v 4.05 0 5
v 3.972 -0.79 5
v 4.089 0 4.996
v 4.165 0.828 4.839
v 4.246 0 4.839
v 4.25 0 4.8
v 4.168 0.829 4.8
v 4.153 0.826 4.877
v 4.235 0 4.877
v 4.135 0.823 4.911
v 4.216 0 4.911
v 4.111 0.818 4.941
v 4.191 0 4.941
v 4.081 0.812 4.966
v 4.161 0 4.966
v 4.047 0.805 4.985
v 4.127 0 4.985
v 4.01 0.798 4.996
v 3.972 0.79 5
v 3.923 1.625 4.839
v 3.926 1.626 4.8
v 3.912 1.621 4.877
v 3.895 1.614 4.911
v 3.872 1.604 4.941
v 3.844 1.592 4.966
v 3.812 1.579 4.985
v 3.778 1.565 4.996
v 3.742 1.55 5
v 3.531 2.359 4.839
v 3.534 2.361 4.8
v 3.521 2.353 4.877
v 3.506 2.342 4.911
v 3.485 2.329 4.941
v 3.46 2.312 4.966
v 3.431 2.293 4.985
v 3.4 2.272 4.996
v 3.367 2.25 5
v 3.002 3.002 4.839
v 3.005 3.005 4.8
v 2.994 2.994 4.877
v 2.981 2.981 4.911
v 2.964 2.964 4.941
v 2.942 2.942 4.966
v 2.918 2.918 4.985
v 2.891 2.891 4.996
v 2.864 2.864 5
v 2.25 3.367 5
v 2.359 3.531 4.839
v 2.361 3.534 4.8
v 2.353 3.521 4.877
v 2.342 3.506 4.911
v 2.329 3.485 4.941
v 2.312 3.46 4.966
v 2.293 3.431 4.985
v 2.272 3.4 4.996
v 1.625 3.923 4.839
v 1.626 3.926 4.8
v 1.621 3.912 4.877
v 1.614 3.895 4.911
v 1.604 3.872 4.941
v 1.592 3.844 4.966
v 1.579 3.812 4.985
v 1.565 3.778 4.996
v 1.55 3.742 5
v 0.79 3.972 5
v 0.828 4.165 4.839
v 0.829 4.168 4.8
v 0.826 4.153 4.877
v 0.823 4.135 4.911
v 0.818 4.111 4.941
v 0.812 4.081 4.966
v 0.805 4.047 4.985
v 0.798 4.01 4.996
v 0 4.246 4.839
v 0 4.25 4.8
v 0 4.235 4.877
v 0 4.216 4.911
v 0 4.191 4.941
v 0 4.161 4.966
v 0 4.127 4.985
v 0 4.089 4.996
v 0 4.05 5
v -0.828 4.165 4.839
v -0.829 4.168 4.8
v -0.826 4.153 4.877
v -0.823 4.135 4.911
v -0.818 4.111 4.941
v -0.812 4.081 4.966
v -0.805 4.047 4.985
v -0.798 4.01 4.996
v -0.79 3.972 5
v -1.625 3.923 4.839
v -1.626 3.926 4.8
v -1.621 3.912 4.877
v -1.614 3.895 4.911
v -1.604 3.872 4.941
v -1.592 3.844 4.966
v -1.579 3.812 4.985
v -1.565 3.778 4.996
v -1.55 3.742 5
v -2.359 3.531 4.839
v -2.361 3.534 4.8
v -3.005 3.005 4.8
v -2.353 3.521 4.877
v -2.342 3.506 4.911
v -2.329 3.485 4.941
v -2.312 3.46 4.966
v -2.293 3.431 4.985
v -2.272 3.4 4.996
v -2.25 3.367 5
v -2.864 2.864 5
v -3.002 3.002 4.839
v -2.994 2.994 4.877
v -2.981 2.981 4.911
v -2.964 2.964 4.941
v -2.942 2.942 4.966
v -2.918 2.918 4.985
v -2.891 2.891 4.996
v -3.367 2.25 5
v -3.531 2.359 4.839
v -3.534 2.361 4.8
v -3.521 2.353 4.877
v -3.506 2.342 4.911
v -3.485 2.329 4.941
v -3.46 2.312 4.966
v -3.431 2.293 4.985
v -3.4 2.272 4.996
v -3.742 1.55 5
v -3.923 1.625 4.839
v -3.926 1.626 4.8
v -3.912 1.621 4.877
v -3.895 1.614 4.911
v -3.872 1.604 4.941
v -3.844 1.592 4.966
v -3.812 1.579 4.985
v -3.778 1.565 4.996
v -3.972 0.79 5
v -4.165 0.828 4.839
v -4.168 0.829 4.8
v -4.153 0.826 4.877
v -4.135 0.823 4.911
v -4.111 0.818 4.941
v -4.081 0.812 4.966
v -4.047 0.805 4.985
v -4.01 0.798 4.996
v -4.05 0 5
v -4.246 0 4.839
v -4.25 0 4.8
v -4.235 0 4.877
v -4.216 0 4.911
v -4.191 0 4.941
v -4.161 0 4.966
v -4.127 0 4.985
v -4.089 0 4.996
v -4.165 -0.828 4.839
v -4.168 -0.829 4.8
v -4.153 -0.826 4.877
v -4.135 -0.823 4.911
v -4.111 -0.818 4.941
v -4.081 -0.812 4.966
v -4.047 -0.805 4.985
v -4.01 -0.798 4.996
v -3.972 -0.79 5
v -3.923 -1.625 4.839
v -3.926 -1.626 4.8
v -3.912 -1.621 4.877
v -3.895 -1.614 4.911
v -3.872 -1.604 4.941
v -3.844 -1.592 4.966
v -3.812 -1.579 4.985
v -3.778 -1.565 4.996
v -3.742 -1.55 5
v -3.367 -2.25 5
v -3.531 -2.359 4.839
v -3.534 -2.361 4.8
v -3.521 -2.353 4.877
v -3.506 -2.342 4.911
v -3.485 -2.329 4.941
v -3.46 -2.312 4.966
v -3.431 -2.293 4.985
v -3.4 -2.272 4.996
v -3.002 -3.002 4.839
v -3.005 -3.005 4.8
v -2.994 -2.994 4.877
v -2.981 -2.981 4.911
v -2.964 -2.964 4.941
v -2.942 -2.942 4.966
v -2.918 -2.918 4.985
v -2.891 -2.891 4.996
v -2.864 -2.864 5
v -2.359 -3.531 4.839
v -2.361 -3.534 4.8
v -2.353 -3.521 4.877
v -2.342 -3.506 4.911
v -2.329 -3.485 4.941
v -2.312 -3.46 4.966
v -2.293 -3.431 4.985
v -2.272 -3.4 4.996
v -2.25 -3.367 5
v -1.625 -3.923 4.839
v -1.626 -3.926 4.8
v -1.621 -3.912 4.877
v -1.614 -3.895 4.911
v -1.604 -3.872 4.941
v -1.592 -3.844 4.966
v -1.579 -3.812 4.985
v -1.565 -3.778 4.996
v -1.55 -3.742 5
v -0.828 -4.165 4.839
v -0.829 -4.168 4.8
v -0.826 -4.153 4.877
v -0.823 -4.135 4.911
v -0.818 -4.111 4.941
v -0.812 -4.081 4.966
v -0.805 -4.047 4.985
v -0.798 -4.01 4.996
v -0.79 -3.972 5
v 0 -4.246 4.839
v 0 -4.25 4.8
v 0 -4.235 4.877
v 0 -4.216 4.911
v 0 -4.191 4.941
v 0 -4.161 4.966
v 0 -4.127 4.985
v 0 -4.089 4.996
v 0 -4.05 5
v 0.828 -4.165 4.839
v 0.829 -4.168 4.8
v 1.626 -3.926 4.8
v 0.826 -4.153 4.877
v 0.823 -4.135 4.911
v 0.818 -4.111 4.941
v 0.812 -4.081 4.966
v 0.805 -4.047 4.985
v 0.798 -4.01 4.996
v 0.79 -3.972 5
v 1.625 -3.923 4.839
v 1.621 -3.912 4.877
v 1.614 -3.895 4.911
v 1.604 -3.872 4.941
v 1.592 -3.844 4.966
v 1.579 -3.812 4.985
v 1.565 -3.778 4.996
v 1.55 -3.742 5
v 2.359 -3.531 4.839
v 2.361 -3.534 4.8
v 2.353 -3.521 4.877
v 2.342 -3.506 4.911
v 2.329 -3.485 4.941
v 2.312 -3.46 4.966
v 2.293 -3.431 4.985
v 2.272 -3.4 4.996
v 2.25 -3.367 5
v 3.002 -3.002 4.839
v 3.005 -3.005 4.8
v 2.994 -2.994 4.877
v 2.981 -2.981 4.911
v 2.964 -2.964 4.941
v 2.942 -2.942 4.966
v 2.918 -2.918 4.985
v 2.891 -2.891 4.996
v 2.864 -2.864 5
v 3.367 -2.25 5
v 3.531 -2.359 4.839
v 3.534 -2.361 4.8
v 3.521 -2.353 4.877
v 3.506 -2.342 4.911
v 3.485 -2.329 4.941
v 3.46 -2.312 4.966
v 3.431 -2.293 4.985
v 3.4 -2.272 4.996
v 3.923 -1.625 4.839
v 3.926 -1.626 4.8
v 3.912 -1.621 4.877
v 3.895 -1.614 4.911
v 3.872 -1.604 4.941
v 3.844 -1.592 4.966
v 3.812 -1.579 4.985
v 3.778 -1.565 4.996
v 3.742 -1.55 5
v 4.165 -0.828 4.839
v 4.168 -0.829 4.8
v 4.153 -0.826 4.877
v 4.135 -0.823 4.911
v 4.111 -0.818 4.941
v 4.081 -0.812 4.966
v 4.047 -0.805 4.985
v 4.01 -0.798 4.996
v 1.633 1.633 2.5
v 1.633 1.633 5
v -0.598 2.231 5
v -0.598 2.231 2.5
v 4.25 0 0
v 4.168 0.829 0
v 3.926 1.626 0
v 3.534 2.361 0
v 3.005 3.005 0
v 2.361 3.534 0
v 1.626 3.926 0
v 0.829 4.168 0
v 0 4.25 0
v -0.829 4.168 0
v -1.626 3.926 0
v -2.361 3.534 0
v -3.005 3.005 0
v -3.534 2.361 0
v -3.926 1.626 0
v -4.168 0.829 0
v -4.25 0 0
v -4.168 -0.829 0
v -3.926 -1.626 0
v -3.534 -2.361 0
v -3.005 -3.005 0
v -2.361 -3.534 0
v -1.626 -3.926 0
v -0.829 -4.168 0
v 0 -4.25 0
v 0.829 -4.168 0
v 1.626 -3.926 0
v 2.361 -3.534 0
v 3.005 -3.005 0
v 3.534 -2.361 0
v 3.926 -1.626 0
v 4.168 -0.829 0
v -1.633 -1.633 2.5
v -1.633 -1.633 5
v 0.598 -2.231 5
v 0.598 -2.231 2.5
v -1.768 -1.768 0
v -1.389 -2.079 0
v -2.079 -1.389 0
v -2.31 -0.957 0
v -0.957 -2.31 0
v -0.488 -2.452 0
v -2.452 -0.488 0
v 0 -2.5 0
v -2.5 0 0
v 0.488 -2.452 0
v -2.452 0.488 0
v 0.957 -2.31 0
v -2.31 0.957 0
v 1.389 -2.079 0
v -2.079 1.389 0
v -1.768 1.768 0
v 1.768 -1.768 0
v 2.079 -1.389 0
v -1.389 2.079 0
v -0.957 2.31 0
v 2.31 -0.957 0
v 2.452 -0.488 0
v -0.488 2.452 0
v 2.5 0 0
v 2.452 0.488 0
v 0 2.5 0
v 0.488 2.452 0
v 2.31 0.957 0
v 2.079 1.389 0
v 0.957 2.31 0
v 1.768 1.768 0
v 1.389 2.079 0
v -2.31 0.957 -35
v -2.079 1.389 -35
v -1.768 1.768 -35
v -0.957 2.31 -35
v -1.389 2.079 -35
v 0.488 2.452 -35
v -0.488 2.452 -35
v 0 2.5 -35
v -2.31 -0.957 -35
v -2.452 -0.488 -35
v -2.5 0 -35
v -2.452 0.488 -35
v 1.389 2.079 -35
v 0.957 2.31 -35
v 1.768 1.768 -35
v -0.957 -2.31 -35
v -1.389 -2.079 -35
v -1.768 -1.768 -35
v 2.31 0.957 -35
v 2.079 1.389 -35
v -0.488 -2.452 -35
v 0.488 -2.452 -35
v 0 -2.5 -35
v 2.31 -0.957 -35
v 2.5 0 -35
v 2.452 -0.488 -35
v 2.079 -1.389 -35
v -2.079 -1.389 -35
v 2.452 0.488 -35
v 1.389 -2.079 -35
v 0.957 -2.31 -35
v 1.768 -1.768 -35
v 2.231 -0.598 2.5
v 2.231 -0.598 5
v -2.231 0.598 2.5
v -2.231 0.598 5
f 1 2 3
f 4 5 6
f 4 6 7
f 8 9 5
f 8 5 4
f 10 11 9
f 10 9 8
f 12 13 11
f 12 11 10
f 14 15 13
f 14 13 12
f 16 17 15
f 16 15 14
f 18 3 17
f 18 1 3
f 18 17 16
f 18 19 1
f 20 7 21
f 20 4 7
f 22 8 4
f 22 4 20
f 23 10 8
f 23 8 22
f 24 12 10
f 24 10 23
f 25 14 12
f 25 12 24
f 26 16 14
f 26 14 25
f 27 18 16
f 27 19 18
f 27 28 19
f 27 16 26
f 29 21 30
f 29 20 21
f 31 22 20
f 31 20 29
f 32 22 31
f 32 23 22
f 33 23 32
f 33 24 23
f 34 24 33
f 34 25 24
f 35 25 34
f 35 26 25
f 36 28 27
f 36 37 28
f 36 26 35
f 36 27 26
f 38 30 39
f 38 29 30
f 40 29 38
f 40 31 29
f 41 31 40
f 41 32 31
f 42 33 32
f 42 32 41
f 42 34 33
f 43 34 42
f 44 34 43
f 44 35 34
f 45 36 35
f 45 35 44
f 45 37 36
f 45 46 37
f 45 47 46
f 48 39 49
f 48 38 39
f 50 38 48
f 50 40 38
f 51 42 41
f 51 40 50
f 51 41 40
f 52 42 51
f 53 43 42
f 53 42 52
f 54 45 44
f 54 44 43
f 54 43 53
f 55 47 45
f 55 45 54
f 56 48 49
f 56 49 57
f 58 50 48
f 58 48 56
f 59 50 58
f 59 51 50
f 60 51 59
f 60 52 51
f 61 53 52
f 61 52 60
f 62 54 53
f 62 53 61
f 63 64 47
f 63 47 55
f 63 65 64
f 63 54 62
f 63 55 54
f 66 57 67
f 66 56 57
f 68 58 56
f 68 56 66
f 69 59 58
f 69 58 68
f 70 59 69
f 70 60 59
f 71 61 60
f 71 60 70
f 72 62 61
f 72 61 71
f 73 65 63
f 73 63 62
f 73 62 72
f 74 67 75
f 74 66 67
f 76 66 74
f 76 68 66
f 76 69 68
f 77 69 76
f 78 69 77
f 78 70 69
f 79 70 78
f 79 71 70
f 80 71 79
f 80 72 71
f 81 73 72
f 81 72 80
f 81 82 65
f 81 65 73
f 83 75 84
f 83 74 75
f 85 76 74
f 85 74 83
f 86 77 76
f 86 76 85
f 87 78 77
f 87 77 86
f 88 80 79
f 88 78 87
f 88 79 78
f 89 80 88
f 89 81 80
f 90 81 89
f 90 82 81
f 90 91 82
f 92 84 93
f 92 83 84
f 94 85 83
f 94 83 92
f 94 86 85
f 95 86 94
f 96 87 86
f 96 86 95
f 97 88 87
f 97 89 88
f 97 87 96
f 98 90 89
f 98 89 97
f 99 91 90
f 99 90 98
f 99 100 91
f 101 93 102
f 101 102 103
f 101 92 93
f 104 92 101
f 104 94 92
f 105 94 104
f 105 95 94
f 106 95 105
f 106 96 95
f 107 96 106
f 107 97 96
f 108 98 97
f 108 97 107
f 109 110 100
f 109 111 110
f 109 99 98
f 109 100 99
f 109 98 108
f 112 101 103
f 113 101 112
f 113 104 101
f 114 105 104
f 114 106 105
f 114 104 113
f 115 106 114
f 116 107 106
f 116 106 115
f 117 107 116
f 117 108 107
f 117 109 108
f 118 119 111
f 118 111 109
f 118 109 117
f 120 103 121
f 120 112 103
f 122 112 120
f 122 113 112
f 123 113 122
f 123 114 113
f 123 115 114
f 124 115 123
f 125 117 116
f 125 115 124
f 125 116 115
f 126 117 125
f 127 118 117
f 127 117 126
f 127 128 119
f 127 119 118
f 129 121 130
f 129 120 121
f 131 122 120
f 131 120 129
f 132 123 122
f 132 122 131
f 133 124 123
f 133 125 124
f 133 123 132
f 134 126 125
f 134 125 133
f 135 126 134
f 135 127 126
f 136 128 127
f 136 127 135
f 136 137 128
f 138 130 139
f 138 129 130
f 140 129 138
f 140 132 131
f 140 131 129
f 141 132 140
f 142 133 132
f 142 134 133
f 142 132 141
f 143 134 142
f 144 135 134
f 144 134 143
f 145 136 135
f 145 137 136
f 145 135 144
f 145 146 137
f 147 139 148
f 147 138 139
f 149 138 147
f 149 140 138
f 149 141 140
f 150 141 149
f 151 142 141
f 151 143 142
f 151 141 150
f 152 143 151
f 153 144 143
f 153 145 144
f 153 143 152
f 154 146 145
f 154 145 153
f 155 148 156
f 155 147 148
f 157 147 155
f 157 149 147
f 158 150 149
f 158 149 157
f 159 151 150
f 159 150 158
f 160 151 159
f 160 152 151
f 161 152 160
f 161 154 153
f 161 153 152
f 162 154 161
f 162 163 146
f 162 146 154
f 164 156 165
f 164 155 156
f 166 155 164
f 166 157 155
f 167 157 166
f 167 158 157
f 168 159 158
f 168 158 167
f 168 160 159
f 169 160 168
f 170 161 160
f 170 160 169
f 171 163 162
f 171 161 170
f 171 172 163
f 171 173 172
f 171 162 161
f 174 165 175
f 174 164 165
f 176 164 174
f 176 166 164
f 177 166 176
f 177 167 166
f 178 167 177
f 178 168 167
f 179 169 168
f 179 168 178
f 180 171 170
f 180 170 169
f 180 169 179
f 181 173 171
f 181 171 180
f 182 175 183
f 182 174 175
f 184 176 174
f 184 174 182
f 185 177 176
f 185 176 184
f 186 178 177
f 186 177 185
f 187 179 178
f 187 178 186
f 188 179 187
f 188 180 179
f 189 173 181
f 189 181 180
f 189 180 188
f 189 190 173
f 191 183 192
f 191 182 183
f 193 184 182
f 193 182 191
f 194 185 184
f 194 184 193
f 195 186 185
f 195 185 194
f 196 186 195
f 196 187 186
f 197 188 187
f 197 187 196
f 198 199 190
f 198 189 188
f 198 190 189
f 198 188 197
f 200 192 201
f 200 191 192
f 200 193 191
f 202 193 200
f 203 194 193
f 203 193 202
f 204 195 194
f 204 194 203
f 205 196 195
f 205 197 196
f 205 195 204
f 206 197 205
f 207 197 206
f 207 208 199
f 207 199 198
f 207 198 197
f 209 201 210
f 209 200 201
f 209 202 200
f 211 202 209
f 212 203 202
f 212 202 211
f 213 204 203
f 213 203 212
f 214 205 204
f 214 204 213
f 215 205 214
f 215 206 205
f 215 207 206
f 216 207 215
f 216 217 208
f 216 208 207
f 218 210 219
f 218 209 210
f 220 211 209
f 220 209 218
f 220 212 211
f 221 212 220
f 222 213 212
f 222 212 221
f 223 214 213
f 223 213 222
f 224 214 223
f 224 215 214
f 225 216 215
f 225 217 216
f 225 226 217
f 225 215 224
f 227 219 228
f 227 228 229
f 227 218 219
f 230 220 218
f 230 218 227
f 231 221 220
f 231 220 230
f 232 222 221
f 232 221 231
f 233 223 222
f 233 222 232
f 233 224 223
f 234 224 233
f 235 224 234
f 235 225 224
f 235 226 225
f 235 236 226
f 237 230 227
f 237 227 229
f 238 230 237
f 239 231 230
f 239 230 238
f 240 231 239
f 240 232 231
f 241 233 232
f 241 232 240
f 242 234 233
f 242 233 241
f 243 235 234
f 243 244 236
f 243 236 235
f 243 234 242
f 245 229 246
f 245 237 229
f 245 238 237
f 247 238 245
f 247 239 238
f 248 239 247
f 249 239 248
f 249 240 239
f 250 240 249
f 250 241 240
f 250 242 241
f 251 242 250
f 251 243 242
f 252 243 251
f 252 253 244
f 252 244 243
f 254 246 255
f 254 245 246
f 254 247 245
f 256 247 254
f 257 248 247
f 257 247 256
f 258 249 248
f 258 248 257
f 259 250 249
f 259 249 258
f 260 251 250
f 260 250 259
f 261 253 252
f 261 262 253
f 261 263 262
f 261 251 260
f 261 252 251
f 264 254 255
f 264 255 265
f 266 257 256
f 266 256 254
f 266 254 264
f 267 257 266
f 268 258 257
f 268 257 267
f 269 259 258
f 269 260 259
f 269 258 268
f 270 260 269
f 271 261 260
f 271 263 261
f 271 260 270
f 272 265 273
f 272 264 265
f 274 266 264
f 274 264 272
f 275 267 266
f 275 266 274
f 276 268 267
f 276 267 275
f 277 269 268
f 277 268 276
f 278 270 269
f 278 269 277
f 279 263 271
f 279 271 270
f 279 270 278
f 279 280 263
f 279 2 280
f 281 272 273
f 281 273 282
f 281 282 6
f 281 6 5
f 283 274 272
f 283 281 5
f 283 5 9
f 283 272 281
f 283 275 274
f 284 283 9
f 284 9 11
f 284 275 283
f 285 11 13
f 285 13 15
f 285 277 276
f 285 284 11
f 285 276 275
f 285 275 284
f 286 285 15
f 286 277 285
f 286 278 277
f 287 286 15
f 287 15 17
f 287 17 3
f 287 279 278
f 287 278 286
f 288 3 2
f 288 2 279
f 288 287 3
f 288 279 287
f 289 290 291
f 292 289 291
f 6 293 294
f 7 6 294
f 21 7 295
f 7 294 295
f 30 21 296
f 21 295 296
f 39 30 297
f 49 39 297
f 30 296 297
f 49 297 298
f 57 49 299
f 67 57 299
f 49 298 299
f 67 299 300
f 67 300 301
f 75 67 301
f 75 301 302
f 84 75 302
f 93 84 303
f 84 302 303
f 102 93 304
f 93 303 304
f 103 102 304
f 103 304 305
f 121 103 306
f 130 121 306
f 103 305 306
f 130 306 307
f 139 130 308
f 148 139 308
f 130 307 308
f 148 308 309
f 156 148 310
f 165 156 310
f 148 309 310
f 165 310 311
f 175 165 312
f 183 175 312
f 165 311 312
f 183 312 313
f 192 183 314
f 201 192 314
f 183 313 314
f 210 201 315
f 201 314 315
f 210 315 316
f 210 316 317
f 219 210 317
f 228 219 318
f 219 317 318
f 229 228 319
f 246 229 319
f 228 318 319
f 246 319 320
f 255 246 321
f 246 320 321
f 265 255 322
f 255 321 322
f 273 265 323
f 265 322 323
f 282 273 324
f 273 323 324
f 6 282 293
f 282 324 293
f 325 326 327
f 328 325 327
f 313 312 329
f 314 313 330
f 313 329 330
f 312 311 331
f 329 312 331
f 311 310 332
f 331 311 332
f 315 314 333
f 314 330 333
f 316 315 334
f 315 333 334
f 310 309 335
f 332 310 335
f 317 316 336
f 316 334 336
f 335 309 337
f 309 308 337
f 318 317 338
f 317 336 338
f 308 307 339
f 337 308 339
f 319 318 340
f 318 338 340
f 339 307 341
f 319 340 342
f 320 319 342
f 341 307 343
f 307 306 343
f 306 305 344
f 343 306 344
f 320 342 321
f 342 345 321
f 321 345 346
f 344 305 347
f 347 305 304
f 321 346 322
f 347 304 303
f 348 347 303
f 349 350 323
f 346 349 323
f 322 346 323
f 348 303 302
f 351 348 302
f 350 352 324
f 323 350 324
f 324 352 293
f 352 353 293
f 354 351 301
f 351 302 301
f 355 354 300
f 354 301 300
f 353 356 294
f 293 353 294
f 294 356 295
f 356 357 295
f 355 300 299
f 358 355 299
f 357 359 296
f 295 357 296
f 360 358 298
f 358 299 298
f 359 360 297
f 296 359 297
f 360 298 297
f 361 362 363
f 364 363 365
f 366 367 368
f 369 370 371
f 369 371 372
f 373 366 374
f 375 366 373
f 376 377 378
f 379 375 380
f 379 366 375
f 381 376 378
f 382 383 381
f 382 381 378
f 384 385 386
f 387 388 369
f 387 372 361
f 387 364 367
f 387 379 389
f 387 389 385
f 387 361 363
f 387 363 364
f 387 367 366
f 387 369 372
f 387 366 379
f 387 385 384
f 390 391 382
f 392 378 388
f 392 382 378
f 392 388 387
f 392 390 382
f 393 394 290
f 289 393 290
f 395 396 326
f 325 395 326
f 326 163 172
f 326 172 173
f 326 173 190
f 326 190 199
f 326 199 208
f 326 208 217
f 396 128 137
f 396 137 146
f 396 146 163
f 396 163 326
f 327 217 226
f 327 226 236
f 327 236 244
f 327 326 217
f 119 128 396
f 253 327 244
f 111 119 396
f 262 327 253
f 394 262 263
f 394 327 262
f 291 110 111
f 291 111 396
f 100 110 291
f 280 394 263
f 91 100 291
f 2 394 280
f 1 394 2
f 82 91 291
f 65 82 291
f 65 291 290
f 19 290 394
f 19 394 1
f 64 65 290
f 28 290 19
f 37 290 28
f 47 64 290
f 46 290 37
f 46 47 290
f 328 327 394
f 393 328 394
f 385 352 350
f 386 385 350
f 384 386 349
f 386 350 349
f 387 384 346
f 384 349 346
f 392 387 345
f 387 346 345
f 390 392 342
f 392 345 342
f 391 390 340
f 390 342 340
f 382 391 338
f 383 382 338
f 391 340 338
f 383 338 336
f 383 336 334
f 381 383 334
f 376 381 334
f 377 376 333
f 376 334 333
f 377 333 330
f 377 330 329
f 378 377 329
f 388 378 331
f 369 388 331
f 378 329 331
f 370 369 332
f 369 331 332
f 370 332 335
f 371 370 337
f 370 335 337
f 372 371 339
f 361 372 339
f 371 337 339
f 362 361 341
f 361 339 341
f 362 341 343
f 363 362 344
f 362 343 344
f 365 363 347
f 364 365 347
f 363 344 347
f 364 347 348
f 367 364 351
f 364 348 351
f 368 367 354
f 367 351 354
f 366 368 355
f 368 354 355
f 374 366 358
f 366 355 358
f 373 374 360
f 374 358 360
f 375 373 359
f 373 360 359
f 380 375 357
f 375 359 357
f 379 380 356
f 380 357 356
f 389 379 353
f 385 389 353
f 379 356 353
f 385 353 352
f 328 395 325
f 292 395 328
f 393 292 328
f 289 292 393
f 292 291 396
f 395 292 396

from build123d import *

# Parameters (mm, degrees)
SKETCH_1_R          = 4.25
EXTRUDE_1_DEPTH     = 5
CUT_EXTRUDE_1_DEPTH = 2.5
SKETCH_3_R          = 2.5
EXTRUDE_2_DEPTH     = 35
FILLET_1_R          = 0.2


with BuildPart() as part:
    # 草图1 → 凸台-拉伸1 (new body)
    with BuildSketch(Plane.XY):
        Circle(SKETCH_1_R)
    extrude(amount=EXTRUDE_1_DEPTH)

    # 草图2 → 切除-拉伸1 (cut)
    with BuildSketch(Plane.XY.offset(5)):
        Polygon((-1.632993162, -1.632993162), (0.597716981, -2.230710143), (2.230710143, -0.597716981), (1.632993162, 1.632993162), (-0.597716981, 2.230710143), (-2.230710143, 0.597716981), align=None)
    extrude(amount=-CUT_EXTRUDE_1_DEPTH, mode=Mode.SUBTRACT)

    # 草图3 → 凸台-拉伸2 (add)
    with BuildSketch(Plane(origin=(0, 0, 0), x_dir=(-1, 0, 0), z_dir=(0, 0, -1))):
        with Locations(Location((0, 0, 0), (0, 0, 180))):
            Circle(SKETCH_3_R)
    extrude(amount=EXTRUDE_2_DEPTH)

    # 圆角1
    fillet_1_edges = [part.edges().sort_by_distance(p)[0] for p in [
        (-4.25, 0, 5),
    ]]
    fillet(fillet_1_edges, radius=FILLET_1_R)


solid = part.part
